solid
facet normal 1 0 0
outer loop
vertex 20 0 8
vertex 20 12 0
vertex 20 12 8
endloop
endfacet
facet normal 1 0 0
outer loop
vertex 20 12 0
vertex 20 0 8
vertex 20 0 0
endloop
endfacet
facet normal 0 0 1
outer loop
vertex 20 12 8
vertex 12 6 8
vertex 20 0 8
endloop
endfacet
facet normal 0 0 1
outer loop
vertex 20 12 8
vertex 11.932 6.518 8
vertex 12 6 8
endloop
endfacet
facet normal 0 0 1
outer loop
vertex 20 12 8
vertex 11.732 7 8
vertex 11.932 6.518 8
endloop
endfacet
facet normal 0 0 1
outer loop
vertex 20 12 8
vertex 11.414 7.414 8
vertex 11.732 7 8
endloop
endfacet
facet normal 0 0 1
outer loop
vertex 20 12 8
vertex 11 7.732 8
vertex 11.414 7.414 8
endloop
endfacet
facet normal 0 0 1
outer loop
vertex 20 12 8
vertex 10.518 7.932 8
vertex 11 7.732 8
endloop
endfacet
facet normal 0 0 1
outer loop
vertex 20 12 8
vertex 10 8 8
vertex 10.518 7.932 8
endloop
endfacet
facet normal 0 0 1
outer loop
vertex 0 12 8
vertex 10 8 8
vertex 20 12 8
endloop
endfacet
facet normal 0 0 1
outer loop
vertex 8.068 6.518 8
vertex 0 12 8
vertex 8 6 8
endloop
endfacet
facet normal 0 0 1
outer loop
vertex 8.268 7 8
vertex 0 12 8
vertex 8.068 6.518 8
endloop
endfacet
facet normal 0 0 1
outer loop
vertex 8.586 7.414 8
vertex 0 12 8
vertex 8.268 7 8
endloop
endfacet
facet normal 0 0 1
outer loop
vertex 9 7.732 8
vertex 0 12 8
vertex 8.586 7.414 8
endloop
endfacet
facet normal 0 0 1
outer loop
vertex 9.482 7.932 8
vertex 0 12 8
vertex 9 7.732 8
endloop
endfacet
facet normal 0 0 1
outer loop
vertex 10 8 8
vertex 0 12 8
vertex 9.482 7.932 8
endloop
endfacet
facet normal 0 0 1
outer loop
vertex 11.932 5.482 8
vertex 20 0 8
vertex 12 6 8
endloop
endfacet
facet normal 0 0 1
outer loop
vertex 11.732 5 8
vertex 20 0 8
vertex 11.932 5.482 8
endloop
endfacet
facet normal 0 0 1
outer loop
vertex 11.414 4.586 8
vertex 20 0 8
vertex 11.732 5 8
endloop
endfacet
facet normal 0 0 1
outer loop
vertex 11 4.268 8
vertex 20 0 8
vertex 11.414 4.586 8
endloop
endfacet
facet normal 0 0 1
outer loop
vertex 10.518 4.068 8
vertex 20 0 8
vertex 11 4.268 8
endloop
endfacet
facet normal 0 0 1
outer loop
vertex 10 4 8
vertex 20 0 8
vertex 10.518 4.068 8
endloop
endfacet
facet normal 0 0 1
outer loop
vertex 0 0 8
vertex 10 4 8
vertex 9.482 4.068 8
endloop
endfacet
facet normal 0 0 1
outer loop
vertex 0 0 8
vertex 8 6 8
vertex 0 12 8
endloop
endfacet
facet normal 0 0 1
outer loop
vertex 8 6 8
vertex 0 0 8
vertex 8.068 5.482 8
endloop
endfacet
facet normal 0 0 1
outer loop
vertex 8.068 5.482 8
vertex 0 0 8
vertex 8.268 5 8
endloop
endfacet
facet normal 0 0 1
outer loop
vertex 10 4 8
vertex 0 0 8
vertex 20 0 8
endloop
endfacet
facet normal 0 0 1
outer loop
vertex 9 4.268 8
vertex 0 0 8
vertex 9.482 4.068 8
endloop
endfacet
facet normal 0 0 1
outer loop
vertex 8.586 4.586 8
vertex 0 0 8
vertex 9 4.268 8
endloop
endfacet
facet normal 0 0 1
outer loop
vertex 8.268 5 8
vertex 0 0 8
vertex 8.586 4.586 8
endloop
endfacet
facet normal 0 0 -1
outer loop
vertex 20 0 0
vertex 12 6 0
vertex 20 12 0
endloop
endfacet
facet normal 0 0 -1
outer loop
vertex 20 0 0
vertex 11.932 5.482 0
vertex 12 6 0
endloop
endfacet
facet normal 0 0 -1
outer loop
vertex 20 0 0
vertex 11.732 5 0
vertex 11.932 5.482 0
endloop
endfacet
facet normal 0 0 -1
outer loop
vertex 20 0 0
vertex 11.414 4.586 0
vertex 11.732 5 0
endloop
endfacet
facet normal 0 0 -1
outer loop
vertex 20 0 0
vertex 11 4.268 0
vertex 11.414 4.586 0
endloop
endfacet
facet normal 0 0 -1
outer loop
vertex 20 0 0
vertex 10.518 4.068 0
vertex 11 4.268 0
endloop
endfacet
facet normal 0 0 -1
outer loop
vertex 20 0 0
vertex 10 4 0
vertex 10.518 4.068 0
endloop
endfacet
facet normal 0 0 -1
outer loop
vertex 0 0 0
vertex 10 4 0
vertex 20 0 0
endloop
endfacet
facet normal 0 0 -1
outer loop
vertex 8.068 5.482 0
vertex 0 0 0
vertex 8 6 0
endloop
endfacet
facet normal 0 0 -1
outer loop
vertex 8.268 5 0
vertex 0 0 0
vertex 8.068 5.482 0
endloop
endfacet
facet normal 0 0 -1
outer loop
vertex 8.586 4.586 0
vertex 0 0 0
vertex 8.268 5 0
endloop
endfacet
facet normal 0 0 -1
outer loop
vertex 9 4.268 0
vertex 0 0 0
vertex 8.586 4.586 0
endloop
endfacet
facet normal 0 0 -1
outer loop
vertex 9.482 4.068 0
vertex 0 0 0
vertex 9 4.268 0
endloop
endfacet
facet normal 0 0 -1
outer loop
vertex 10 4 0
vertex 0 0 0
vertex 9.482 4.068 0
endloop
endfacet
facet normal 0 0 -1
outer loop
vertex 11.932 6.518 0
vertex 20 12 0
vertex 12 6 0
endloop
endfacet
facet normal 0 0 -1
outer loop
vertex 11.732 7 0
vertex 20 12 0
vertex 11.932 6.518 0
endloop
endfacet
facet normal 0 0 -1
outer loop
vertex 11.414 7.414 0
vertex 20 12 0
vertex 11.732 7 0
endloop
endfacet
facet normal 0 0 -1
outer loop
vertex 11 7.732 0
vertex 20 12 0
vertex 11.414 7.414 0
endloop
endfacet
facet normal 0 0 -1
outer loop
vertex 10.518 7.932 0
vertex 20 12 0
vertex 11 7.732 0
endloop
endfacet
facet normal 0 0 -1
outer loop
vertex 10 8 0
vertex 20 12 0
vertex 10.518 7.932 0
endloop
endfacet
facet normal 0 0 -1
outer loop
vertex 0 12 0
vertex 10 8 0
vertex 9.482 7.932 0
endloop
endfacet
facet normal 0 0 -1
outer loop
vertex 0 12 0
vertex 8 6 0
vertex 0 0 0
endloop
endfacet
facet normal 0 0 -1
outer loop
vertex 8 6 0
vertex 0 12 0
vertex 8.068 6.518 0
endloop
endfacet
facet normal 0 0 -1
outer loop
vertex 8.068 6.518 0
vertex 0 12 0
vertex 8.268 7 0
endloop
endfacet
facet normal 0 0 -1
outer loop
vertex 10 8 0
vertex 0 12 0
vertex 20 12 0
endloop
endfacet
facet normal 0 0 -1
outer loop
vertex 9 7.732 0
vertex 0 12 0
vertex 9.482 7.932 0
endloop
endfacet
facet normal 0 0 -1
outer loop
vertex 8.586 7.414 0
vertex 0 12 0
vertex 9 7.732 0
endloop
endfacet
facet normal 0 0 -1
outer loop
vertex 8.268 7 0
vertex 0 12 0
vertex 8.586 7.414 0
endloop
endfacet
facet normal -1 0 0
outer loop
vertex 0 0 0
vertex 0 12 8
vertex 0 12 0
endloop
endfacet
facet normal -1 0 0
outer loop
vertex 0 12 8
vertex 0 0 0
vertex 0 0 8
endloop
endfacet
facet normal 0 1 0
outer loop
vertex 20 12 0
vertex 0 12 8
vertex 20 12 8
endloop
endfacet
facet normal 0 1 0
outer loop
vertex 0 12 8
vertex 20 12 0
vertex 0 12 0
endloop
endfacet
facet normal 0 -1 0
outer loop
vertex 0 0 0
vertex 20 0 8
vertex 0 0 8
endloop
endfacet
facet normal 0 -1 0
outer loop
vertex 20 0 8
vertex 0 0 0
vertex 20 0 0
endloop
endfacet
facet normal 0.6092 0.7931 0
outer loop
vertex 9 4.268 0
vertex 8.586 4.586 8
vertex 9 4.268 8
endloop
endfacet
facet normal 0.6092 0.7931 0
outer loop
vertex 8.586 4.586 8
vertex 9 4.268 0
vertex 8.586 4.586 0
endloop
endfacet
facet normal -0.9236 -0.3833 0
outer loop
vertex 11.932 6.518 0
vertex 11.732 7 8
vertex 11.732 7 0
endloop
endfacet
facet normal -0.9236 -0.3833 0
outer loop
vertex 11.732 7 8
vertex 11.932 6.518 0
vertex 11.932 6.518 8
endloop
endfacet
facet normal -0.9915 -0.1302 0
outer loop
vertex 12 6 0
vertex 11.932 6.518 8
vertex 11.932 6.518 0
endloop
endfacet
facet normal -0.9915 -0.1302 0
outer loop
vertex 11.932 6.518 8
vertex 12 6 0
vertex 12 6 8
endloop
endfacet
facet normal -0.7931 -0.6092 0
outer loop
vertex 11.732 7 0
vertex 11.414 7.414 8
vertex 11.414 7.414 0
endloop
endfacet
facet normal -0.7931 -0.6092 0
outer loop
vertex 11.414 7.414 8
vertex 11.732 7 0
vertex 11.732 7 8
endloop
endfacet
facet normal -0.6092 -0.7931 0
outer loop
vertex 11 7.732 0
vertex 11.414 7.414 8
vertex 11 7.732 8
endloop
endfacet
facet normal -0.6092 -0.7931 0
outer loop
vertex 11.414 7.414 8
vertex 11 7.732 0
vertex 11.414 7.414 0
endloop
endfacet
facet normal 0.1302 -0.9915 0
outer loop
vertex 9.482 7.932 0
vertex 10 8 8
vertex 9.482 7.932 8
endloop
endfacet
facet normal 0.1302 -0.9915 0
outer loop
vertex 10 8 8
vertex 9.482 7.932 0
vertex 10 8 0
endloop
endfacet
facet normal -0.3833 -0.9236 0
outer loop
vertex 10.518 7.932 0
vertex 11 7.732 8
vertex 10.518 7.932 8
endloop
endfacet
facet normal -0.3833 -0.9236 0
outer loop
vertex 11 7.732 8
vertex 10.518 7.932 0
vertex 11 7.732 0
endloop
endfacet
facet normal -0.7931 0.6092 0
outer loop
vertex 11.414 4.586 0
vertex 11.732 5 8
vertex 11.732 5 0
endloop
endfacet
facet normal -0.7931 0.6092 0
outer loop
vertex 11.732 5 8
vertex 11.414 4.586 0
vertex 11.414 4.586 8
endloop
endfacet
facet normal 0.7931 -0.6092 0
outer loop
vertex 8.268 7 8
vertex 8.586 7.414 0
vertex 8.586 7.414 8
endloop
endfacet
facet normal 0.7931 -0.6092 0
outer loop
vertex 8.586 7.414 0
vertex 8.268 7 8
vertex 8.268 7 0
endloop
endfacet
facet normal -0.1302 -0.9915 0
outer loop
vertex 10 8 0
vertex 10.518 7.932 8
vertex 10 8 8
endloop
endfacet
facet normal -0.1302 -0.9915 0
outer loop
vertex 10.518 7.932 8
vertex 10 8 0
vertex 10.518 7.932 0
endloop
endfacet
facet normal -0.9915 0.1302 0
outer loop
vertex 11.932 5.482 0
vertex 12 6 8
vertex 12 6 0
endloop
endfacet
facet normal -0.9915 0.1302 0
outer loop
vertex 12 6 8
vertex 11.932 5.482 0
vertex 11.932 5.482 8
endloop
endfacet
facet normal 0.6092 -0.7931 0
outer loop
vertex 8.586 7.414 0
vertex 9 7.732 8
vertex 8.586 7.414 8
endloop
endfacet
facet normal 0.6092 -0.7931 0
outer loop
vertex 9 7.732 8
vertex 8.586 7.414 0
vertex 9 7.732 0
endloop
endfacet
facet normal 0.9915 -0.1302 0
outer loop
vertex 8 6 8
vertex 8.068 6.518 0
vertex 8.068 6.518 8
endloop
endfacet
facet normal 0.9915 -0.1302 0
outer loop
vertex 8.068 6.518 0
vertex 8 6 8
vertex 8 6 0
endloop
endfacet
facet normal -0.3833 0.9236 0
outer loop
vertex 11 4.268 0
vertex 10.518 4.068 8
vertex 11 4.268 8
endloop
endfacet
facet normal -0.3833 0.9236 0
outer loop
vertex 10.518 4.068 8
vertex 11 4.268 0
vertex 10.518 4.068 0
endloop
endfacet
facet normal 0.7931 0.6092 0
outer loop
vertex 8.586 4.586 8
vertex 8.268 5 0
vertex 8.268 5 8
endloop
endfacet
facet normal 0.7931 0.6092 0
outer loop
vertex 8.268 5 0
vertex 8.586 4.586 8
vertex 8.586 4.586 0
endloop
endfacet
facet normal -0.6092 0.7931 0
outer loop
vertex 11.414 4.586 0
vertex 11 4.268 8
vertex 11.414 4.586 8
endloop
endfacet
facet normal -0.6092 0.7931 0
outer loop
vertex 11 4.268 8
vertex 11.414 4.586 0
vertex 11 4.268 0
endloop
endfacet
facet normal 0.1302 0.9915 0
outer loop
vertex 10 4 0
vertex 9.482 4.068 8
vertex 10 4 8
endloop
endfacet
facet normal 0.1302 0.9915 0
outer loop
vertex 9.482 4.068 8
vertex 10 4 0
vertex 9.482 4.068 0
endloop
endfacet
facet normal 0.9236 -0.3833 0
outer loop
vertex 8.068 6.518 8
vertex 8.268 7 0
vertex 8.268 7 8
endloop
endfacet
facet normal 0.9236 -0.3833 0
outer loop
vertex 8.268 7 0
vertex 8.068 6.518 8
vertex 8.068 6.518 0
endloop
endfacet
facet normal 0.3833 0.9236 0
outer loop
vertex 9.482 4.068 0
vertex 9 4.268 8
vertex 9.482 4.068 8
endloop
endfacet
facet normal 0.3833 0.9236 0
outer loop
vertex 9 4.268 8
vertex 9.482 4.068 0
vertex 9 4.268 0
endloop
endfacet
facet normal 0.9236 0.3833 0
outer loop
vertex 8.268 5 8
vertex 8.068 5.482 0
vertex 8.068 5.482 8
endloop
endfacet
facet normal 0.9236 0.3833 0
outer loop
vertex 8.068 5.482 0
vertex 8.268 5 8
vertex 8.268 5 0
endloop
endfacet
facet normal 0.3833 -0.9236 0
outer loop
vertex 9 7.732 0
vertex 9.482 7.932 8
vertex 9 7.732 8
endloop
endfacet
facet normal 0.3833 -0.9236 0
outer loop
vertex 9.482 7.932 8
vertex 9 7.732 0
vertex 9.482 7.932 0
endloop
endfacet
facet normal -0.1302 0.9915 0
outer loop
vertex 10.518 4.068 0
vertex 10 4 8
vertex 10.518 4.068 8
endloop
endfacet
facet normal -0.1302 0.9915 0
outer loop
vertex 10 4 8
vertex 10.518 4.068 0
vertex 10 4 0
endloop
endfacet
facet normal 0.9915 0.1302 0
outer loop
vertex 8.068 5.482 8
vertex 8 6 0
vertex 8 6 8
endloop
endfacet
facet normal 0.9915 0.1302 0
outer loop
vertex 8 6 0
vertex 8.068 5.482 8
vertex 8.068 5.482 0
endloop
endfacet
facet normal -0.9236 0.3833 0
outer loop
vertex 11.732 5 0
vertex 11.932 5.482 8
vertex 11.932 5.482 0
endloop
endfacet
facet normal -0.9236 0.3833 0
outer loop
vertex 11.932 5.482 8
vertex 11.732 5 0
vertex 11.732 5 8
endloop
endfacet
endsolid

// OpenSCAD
$fn=24;
difference(){cube([20,12,8]);translate([10,6,-1])cylinder(h=10,r=2);}
